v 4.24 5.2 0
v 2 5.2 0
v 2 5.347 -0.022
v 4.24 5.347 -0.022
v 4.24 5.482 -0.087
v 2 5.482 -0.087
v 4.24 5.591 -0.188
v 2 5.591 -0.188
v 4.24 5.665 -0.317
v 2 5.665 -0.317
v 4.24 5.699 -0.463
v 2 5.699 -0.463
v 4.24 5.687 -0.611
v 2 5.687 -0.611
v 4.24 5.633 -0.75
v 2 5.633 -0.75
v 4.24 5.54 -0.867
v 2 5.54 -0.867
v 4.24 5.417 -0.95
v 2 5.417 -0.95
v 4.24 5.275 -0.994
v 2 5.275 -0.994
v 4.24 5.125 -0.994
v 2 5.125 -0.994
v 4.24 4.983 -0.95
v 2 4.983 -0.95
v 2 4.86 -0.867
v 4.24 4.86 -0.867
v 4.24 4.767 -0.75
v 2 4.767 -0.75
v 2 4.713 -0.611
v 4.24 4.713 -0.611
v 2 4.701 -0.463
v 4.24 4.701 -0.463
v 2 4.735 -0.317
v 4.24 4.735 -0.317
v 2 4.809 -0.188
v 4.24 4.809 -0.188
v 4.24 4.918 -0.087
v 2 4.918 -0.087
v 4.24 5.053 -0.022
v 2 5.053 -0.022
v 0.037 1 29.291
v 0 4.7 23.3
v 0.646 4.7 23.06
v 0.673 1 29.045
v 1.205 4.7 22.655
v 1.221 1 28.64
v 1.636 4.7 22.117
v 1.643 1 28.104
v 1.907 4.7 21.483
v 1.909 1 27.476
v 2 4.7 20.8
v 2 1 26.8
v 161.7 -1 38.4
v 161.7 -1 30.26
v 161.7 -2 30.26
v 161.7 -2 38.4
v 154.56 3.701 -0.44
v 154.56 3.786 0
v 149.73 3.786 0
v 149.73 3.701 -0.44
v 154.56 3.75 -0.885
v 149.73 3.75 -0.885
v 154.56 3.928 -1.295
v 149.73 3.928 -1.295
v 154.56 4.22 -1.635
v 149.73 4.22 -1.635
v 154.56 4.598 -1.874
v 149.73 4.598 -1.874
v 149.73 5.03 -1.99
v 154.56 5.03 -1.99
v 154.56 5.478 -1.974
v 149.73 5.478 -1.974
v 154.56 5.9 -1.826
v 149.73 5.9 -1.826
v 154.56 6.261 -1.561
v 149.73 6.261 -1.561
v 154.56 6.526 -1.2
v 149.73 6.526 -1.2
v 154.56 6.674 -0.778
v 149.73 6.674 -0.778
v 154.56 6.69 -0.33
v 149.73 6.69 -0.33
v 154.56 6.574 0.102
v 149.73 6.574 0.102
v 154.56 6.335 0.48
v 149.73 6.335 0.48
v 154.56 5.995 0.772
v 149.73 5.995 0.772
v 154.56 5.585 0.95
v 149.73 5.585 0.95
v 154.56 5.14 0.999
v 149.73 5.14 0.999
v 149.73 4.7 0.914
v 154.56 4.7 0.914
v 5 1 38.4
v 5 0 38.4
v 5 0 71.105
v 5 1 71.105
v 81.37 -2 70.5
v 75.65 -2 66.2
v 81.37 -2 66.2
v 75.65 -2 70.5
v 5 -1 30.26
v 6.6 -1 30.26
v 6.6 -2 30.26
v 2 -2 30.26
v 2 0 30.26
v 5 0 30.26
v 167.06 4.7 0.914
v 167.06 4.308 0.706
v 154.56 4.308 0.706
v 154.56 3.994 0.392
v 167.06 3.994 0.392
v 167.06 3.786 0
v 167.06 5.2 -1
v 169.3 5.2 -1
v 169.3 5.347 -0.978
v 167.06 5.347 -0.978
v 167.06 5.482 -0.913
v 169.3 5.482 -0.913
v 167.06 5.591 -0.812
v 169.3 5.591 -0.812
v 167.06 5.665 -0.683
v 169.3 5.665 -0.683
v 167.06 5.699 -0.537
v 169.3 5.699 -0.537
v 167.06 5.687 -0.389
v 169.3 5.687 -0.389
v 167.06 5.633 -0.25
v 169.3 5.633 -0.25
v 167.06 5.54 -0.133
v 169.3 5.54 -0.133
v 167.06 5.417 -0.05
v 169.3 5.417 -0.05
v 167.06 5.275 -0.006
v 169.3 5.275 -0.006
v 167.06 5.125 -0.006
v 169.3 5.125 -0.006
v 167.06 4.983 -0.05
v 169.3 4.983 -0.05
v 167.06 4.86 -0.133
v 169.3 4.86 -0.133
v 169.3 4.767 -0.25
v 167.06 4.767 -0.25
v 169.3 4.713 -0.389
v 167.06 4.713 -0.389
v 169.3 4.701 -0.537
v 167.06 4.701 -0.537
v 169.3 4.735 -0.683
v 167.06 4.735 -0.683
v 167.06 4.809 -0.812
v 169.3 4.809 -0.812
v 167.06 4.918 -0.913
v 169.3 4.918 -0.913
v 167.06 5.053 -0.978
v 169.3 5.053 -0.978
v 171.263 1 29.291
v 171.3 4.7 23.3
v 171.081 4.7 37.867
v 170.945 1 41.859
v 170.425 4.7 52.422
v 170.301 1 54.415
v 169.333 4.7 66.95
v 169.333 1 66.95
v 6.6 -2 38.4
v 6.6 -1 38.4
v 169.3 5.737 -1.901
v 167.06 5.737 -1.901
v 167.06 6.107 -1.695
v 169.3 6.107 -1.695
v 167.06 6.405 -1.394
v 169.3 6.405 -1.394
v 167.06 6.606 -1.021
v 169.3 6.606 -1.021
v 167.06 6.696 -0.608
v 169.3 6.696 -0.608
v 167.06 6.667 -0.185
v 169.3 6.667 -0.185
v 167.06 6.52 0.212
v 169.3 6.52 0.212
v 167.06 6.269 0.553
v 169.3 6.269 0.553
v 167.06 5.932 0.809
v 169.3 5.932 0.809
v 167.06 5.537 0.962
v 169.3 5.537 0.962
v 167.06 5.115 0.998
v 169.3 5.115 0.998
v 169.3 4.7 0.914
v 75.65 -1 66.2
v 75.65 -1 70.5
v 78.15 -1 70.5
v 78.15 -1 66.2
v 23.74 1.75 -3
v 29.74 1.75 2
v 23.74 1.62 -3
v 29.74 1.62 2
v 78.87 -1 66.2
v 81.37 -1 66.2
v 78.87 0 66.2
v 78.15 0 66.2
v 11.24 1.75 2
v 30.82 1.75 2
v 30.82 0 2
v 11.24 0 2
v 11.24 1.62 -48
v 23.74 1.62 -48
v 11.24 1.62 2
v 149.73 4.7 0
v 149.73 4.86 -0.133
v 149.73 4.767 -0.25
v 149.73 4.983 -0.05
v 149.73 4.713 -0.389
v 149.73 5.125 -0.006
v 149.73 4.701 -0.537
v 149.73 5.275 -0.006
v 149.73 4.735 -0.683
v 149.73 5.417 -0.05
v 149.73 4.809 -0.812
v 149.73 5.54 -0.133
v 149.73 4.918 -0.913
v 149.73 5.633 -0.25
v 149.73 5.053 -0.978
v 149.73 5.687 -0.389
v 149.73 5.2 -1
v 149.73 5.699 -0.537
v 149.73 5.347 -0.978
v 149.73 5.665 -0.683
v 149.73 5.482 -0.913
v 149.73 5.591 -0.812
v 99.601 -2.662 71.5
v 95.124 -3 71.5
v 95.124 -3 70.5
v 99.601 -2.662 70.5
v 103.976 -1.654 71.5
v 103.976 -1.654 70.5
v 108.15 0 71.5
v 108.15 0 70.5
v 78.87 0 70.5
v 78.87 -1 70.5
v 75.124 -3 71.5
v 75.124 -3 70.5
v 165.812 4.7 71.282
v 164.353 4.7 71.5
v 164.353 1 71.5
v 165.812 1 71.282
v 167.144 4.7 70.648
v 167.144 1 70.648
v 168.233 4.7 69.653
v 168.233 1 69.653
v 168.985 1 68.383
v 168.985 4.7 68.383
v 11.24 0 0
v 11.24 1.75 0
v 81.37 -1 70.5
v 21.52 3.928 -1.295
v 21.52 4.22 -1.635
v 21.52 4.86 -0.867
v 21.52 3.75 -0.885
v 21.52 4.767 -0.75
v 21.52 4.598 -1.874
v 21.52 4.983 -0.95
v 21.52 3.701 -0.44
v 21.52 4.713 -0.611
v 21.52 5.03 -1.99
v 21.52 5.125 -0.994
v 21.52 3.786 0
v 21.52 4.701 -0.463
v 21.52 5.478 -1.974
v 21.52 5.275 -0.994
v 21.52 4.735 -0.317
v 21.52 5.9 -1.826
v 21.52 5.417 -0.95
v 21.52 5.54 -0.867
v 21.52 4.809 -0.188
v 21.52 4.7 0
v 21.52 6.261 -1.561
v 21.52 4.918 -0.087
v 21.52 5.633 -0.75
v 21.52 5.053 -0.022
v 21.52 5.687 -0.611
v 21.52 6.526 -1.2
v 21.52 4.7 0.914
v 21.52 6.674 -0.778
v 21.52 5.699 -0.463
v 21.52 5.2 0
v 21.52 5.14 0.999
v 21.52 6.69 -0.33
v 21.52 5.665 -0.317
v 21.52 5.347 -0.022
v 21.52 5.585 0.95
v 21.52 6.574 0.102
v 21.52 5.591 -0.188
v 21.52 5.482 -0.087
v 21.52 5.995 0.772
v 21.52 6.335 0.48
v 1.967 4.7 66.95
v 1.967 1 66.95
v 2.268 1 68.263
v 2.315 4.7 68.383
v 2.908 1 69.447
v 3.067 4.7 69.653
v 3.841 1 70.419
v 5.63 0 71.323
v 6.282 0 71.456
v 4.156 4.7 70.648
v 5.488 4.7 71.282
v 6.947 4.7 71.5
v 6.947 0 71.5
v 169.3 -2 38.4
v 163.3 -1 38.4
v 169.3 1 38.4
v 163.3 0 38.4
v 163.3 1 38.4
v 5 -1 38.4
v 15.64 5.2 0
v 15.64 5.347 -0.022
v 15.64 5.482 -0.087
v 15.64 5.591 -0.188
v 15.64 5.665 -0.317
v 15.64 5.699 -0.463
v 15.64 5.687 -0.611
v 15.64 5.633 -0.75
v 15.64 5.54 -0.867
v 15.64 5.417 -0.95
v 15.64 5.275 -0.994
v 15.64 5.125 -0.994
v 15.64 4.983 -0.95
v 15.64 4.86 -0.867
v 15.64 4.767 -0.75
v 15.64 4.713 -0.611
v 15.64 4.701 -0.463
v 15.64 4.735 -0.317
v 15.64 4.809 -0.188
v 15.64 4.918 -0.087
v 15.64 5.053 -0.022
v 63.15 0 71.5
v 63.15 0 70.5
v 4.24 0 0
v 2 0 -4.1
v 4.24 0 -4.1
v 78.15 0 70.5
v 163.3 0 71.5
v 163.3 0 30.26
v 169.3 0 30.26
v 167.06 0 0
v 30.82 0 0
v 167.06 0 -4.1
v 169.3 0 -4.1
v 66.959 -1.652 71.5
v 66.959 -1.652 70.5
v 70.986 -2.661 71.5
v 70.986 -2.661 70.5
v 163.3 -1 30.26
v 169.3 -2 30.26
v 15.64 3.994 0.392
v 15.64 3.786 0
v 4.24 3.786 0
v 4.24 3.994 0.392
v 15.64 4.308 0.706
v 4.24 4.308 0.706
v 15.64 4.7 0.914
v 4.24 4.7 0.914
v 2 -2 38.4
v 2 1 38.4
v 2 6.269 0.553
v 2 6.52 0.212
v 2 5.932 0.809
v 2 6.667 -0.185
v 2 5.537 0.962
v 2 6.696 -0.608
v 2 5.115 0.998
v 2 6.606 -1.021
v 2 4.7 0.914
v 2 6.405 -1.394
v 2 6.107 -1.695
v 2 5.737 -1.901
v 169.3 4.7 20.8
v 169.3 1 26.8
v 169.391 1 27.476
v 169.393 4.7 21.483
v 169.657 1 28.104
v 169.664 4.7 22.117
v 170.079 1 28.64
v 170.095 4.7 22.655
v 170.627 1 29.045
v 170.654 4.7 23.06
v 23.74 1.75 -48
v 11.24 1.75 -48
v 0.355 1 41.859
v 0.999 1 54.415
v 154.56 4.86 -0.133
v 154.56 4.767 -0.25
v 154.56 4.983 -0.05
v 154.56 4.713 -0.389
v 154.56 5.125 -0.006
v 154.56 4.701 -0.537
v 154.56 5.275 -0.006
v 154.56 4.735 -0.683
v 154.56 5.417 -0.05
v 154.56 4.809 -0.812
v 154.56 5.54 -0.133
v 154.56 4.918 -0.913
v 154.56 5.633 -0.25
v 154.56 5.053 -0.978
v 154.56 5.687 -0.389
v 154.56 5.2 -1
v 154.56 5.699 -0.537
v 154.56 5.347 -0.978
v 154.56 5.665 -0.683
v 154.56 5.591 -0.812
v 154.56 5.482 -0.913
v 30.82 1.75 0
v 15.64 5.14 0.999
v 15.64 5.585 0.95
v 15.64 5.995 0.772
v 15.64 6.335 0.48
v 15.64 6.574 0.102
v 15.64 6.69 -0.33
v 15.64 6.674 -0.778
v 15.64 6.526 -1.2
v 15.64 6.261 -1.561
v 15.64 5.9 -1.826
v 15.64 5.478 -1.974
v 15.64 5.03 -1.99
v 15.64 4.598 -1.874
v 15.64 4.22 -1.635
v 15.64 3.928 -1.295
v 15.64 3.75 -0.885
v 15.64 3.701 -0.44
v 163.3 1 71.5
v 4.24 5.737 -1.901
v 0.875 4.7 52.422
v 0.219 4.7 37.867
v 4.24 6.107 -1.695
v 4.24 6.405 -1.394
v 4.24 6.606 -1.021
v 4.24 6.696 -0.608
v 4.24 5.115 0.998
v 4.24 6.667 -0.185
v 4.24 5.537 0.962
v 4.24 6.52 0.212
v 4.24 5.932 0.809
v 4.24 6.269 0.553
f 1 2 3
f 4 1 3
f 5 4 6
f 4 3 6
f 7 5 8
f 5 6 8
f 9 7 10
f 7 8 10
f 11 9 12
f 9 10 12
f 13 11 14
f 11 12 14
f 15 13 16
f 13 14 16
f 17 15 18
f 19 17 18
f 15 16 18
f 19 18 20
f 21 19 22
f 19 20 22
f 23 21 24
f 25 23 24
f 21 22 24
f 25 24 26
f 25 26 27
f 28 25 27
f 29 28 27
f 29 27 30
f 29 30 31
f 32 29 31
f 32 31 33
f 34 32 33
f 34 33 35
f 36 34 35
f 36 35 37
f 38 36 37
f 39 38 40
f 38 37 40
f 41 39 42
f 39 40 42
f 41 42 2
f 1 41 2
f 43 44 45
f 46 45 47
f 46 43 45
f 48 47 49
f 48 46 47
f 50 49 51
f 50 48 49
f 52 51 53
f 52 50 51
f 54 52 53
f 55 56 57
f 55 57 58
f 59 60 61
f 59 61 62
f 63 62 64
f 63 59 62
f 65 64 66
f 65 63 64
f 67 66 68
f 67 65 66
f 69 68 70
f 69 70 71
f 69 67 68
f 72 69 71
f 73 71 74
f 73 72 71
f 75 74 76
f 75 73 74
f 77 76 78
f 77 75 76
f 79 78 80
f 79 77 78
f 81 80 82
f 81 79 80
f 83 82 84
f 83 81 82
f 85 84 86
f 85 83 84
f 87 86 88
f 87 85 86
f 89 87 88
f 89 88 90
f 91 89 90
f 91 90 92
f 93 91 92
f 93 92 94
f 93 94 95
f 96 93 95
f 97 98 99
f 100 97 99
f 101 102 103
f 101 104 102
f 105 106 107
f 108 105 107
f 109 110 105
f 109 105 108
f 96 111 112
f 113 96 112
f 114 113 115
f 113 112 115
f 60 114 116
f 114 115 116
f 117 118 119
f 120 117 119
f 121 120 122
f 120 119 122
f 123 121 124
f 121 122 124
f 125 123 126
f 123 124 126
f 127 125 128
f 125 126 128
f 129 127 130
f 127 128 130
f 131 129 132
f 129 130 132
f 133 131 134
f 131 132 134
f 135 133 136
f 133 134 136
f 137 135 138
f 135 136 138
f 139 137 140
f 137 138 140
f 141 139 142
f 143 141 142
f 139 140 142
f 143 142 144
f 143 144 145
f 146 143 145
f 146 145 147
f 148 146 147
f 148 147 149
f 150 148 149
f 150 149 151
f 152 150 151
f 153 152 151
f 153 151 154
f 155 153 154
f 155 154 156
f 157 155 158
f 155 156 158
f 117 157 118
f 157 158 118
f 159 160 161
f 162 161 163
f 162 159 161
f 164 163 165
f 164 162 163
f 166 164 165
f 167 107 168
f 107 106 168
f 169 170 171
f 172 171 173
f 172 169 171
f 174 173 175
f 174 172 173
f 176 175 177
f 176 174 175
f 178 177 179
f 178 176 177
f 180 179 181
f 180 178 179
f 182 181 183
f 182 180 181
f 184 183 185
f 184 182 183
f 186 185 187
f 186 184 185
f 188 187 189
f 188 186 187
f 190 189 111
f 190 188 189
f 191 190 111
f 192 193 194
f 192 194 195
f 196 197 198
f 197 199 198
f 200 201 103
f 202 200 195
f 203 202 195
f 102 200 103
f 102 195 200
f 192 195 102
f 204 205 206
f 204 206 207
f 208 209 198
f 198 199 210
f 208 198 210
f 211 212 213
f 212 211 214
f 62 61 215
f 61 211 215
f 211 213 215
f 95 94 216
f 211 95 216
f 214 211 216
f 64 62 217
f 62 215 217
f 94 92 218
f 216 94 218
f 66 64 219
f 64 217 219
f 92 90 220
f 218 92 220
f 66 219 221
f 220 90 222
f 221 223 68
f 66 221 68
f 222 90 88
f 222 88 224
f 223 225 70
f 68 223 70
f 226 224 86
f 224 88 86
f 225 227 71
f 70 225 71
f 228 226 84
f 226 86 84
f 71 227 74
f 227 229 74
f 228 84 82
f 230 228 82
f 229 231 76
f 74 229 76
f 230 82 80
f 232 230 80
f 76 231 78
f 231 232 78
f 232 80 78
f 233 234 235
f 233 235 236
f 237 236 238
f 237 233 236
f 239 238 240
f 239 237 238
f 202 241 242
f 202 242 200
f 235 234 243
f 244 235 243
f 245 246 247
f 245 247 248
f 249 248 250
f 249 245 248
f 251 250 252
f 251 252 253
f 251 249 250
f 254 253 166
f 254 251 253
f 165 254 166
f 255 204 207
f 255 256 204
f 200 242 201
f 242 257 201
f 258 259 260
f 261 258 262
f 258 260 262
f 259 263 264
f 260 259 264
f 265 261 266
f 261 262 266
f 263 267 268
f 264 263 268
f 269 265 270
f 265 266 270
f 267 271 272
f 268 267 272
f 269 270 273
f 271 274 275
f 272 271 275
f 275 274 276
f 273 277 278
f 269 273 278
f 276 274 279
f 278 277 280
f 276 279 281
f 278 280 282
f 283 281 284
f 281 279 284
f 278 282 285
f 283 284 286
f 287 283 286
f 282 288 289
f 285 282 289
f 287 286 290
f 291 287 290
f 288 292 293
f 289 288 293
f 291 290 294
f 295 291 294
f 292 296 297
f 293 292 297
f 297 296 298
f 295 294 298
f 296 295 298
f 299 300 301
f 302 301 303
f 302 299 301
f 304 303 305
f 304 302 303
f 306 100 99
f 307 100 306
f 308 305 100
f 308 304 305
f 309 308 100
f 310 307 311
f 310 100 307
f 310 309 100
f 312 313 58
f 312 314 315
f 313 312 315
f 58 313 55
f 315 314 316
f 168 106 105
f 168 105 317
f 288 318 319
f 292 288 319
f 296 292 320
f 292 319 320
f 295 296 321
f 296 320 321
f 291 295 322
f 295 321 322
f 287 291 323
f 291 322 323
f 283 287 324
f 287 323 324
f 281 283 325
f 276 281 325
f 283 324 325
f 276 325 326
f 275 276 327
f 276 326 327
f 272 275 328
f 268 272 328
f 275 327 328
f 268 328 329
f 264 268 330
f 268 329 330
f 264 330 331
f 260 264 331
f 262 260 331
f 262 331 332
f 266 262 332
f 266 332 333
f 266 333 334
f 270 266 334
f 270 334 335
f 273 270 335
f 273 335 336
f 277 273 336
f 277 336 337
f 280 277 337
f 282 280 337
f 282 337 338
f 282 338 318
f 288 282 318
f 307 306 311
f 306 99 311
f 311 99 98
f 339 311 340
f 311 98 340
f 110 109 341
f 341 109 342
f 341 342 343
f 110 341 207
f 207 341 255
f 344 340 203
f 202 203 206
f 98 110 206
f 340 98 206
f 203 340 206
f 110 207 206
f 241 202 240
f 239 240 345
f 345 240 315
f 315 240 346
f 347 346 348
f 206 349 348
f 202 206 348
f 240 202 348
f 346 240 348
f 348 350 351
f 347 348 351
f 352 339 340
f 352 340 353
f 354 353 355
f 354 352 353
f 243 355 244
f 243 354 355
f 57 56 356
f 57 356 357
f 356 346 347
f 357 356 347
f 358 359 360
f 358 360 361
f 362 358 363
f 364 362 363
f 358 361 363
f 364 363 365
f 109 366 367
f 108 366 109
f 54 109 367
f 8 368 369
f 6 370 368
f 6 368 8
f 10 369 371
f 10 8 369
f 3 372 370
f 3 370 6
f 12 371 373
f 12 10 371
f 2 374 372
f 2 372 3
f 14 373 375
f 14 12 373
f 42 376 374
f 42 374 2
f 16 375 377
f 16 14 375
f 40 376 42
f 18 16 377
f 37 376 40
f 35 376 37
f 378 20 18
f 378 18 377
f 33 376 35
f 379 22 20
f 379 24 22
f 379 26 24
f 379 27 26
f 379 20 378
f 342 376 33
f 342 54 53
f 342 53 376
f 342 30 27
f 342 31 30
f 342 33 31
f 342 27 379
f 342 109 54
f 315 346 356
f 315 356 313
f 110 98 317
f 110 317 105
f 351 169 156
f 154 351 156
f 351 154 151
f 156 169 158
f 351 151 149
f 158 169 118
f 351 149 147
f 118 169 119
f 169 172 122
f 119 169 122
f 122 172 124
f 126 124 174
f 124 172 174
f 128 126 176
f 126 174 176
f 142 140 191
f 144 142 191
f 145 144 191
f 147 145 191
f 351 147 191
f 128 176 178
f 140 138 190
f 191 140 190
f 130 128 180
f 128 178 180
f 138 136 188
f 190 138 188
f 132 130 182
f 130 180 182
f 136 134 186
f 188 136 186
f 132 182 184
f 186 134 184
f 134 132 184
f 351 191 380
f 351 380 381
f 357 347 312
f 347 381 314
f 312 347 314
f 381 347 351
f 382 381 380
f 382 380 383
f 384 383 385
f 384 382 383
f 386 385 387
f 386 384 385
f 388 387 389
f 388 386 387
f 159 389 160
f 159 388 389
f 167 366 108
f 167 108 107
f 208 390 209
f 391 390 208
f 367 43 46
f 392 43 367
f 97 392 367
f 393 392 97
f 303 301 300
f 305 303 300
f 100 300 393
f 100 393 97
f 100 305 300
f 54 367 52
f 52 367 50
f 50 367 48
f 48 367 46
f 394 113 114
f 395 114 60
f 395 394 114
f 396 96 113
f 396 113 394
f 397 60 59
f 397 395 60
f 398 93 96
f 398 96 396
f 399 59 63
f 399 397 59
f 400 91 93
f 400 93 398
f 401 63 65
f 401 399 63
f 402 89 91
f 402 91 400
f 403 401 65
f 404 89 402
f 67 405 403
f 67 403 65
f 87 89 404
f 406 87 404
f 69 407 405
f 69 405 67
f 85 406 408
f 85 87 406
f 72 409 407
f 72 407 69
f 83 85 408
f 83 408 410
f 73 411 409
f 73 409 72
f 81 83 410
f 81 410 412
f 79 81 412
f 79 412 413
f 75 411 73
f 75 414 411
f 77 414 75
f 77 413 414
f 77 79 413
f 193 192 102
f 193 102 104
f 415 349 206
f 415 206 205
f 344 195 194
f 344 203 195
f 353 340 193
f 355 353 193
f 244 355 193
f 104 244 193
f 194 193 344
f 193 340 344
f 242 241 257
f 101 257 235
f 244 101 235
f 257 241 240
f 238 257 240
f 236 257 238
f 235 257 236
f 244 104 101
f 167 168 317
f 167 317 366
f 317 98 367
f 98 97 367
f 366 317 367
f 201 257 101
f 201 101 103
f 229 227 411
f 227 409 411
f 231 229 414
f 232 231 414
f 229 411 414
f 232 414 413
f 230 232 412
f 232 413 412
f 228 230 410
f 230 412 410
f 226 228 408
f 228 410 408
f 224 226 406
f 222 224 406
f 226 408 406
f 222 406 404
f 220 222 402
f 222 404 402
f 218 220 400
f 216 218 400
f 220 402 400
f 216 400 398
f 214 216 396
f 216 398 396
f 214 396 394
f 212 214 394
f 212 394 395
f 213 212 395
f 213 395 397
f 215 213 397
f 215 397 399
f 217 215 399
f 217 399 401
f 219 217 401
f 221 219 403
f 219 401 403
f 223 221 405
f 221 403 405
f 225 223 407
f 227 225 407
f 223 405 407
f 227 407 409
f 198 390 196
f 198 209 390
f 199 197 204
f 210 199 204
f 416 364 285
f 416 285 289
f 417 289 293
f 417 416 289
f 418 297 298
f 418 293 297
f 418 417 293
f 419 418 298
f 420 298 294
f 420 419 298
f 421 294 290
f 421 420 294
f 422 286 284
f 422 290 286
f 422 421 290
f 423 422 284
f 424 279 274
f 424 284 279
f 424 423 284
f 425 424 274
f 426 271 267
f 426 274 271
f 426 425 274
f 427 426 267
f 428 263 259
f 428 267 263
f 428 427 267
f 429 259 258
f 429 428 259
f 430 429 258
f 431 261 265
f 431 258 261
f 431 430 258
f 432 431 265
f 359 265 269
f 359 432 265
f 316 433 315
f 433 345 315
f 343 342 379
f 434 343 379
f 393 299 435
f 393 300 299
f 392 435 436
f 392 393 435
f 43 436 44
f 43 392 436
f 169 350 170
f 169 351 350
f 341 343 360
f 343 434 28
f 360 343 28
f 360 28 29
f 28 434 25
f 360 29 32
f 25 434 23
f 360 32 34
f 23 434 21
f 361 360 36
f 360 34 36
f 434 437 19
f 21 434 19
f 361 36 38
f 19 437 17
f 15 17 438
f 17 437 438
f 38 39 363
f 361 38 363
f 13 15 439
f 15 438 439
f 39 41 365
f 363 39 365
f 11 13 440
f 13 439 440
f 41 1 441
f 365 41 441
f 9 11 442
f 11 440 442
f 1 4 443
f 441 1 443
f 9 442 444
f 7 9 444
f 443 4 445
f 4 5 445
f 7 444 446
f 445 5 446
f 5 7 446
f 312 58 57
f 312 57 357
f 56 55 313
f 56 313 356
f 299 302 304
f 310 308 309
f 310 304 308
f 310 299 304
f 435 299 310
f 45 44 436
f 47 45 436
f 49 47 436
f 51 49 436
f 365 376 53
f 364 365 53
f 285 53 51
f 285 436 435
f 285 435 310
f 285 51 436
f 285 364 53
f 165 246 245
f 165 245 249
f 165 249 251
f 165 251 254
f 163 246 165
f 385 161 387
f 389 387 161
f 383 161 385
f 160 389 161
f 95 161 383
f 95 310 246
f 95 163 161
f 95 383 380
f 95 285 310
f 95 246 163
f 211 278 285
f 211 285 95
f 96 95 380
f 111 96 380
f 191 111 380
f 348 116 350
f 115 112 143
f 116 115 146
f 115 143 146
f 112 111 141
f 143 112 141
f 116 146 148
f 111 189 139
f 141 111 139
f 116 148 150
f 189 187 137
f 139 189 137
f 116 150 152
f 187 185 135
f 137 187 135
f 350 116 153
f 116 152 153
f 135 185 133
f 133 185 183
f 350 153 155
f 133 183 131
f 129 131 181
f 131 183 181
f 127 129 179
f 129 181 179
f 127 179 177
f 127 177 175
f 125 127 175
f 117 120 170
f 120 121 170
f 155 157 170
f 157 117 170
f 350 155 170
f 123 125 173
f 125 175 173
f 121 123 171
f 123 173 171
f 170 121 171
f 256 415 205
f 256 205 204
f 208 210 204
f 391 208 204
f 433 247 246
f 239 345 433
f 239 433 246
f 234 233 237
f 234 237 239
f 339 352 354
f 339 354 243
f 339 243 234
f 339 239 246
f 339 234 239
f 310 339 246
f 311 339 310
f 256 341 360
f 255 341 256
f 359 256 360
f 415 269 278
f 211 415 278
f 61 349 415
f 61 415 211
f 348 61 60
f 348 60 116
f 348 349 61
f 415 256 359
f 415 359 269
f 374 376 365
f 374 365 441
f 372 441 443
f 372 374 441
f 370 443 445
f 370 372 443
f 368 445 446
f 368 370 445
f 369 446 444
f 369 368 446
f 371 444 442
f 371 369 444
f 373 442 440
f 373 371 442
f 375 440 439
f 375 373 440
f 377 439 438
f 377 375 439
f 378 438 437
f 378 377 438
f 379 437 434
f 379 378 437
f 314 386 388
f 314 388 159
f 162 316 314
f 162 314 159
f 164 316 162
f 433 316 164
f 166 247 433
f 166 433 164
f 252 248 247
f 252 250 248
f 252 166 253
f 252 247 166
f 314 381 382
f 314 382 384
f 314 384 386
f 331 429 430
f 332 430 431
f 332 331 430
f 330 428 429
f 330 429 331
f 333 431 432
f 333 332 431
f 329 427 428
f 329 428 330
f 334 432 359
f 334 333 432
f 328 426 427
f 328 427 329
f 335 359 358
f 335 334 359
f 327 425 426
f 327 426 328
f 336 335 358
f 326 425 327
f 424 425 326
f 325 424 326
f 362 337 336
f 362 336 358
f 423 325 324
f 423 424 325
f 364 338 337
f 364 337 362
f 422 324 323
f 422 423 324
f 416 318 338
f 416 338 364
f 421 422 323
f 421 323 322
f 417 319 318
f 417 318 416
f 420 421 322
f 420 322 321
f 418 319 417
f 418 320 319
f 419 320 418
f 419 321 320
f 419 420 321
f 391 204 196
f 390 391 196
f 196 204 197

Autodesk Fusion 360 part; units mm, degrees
sketch "Sketch1" plane through (0, 0, 0) normal (0, 1, 0) x (1, 0, 0)
  line L0 (0, 0) -> (171.3, 0)
  line L1 (171.3, 0) -> (171.3, -71.5)
  line L2 (171.3, -71.5) -> (0, -71.5)
  line L3 (0, -71.5) -> (0, 0)
  line L4 (171.3, 0) -> (169.3, 0)
  line L5 (169.3, 0) -> (169.3, -23.3)
  line L6 (169.3, -23.3) -> (171.3, -23.3)
  line L7 (171.3, -23.3) -> (171.3, 0)
  line L8 (0, 0) -> (2, 0)
  line L9 (2, 0) -> (2, -23.3)
  line L10 (2, -23.3) -> (0, -23.3)
  line L11 (0, -23.3) -> (0, 0)
  arc A0 (0, -23.3) -> (2.4, -71.5) centre (485.2085, -23.3) ccw
  arc A1 (168.9, -71.5) -> (171.3, -23.3) centre (-313.9083, -23.3) ccw
  line L12 (2, 0) -> (0, 0)
  line L13 (0, 0) -> (0, -20.8)
  line L14 (0, -20.8) -> (2, -20.8)
  line L15 (2, -20.8) -> (2, 0)
  arc A2 (0, -23.3) -> (2, -20.8) centre (-0.5625, -20.8) ccw
  line L16 (171.3, 0) -> (169.3, 0)
  line L17 (169.3, 0) -> (169.3, -20.8)
  line L18 (169.3, -20.8) -> (171.3, -20.8)
  line L19 (171.3, -20.8) -> (171.3, 0)
  arc A3 (169.3, -20.8) -> (171.3, -23.3) centre (171.8625, -20.8) ccw
  dimension "d1" = 171.3
  dimension "d2" = 71.5
  dimension "d3" = 23.3
  dimension "d4" = 2
  dimension "d5" = 2
  dimension "d6" = 23.3
  dimension "d7" = 2.4
  dimension "d8" = 2.4
  dimension "d15" = 2.5
  dimension "d16" = 2.5
extrude "Extrude1" add sketch "Sketch1" along normal blind 4.7 contours L0 L2 L5 L6 L9 L10 A0 A1 L15 L17 | L9 L10 A2 | L5 L6 A3 makes body 1
sketch "Right Arm" plane through (169.3, 0, 0) normal (1, 0, 0) x (0, 0, -1)
  line L0 (-20.8, 0) -> (0, 0)
  line L1 (0, 0) -> (0, 4.7)
  line L2 (0, 4.7) -> (-20.8, 4.7)
  line L3 (-20.8, 4.7) -> (-20.8, 0)
  circle A0 centre (0.5, 5.2) radius 1.5
  line L4 (0, 0) -> (4.1, 0)
  line L5 (4.1, 0) -> (1.9006, 5.737)
  circle A1 centre (0.5, 5.2) radius 0.5
  dimension "d20" = 0.5
  dimension "d21" = 0.5
  dimension "d22" = 3
  dimension "d23" = 4.1
  dimension "d26" = 1
extrude "Extrude3" cut sketch "Right Arm" against normal blind 14.74 contours L1 L2 A0 | L1 L2 A0 bodies 1
extrude "Extrude2" add sketch "Right Arm" against normal blind 19.57 contours L1 L2 A0 | L1 L2 A0 bodies 1
extrude "Extrude4" cut sketch "Right Arm" against normal blind 14.74 contours L1 L2 A0 | L1 L2 A0 bodies 1
extrude "Extrude5" add sketch "Right Arm" against normal blind 2.24 contours L1 A0 L4 L5 | L1 L2 A0 | L1 L2 A0 bodies 1
sketch "Left Arm" plane through (2, 0, 0) normal (-1, 0, 0) x (0, 0, 1)
  line L0 (0, 0) -> (20.8, 0)
  line L1 (20.8, 0) -> (20.8, 4.7)
  line L2 (20.8, 4.7) -> (0, 4.7)
  line L3 (0, 4.7) -> (0, 0)
  circle A0 centre (-0.5, 5.2) radius 1.5
  line L4 (0, 0) -> (-4.1, 0)
  line L5 (-4.1, 0) -> (-1.766, 6.0881)
  circle A1 centre (-0.5, 5.2) radius 0.5
  dimension "d42" = 3
  dimension "d43" = 1
  dimension "d44" = 0.5
  dimension "d45" = 0.5
  dimension "d46" = 4.1
extrude "Extrude6" add sketch "Left Arm" against normal blind 19.52 contours L2 L3 A0 | L2 L3 A0 bodies 1
extrude "Extrude7" cut sketch "Left Arm" against normal blind 13.64 contours L2 L3 A0 | L2 L3 A0 bodies 1
extrude "Extrude8" add sketch "Left Arm" against normal blind 2.24 contours L3 A0 L4 L5 | L2 L3 A0 | L2 L3 A0 bodies 1
sketch "Cable Cutaway" plane through (0, 0, 0) normal (0, 0, -1) x (-1, 0, 0)
  line L0 (-4.24, 0) -> (-4.24, 3.7858)
  line L1 (-4.24, 3.7858) -> (-15.64, 3.7858)
  line L2 (-15.64, 3.7858) -> (-21.52, 3.7858)
  line L3 (-21.52, 3.7858) -> (-21.52, 4.7)
  line L4 (-21.52, 4.7) -> (-149.73, 4.7)
  line L5 (-149.73, 4.7) -> (-149.73, 3.7858)
  line L6 (-149.73, 3.7858) -> (-154.56, 3.7858)
  line L7 (-154.56, 3.7858) -> (-167.06, 3.7858)
  line L8 (-167.06, 3.7858) -> (-167.06, 0)
  line L9 (-167.06, 0) -> (-4.24, 0)
  line L10 (-11.24, 0) -> (-30.82, 0)
  line L11 (-30.82, 0) -> (-30.82, 1.75)
  line L12 (-30.82, 1.75) -> (-11.24, 1.75)
  line L13 (-11.24, 1.75) -> (-11.24, 0)
  dimension "d53" = 7
  dimension "d57" = 19.58
  dimension "d59" = 1.75
extrude "Extrude9" cut sketch "Cable Cutaway" against normal blind 2 contours L9 L10 L11 L12 L13 bodies 1
sketch "Cable Extrusion" plane through (0, 0, 2) normal (0, 0, -1) x (-1, 0, 0)
  line L0 (-11.24, 1.75) -> (-30.82, 1.75)
  line L1 (-30.82, 1.75) -> (-30.82, 0)
  line L2 (-30.82, 0) -> (-11.24, 0)
  line L3 (-11.24, 0) -> (-11.24, 1.75)
  line L4 (-11.24, 1.75) -> (-29.74, 1.75)
  line L5 (-29.74, 1.75) -> (-29.74, 1.62)
  line L6 (-29.74, 1.62) -> (-11.24, 1.62)
  line L7 (-11.24, 1.62) -> (-11.24, 1.75)
  dimension "d63" = 0.13
  dimension "d64" = 18.5
extrude "Extrude10" add sketch "Cable Extrusion" along normal blind 50 separate body contours L0 L3 L4 L5 L6 L7 makes body 2
sketch "Cable" plane through (0, 1.62, 0) normal (0, -1, 0) x (1, 0, 0)
  line L0 (29.74, 2) -> (11.24, 2)
  line L1 (11.24, 2) -> (11.24, -48)
  line L2 (11.24, -48) -> (29.74, -48)
  line L3 (29.74, -48) -> (29.74, 2)
  line L4 (11.24, -48) -> (23.74, -48)
  line L5 (23.74, -48) -> (23.74, -3)
  line L6 (23.74, -3) -> (11.24, -3)
  line L7 (11.24, -3) -> (11.24, -48)
  line L8 (29.74, 2) -> (23.74, -3)
  dimension "d69" = 12.5
  dimension "d72" = 5
extrude "Extrude11" cut sketch "Cable" against normal blind 0.13 contours L0 L1 L6 L8 | L1 L2 L4 L5 L6 L7 keep common part bodies 2
sketch "Hooks" plane through (0, 0, 0) normal (0, -1, 0) x (1, 0, 0)
  line L0 (11.24, 0) -> (11.24, 2)
  line L1 (11.24, 2) -> (30.82, 2)
  line L2 (30.82, 2) -> (30.82, 0)
  line L3 (30.82, 0) -> (167.06, 0)
  line L4 (167.06, 0) -> (167.06, -4.1)
  line L5 (167.06, -4.1) -> (169.3, -4.1)
  line L6 (169.3, -4.1) -> (169.3, 20.8)
  arc A0 (171.3, 23.3) -> (169.3, 20.8) centre (171.8625, 20.8) ccw
  arc A1 (171.3, 23.3) -> (168.9, 71.5) centre (-313.9083, 23.3) ccw
  line L7 (168.9, 71.5) -> (2.4, 71.5)
  arc A2 (2.4, 71.5) -> (0, 23.3) centre (485.2085, 23.3) ccw
  arc A3 (2, 20.8) -> (0, 23.3) centre (-0.5625, 20.8) ccw
  line L8 (2, 20.8) -> (2, -4.1)
  line L9 (2, -4.1) -> (4.24, -4.1)
  line L10 (4.24, -4.1) -> (4.24, 0)
  line L11 (4.24, 0) -> (11.24, 0)
  line L12 (2, -4.1) -> (169.3, -4.1)
  line L13 (169.3, -4.1) -> (169.3, 38.4)
  line L14 (169.3, 38.4) -> (2, 38.4)
  line L15 (2, 38.4) -> (2, -4.1)
  line L16 (169.3, 20.8) -> (169.3, 0)
  line L17 (163.3, 38.4) -> (5, 38.4)
  line L18 (5, 38.4) -> (5, 71.5)
  line L19 (5, 71.5) -> (163.3, 71.5)
  line L20 (163.3, 71.5) -> (163.3, 38.4)
  line L21 (169.3, 38.4) -> (163.3, 38.4)
  line L22 (163.3, 38.4) -> (163.3, 30.26)
  line L23 (163.3, 30.26) -> (169.3, 30.26)
  line L24 (169.3, 30.26) -> (169.3, 38.4)
  line L25 (163.3, 30.26) -> (161.7, 30.26)
  line L26 (161.7, 30.26) -> (161.7, 38.4)
  line L27 (161.7, 38.4) -> (163.3, 38.4)
  line L28 (163.3, 38.4) -> (163.3, 30.26)
  line L29 (2, 38.4) -> (5, 38.4)
  line L30 (5, 38.4) -> (5, 30.26)
  line L31 (5, 30.26) -> (2, 30.26)
  line L32 (2, 30.26) -> (2, 38.4)
  line L33 (5, 30.26) -> (6.6, 30.26)
  line L34 (6.6, 30.26) -> (6.6, 38.4)
  line L35 (6.6, 38.4) -> (5, 38.4)
  line L36 (5, 38.4) -> (5, 30.26)
  dimension "d75" = 42.5
  dimension "d89" = 1.6
  dimension "d90" = 1.6
  dimension "d91" = 8.14
  dimension "d92" = 8.14
  dimension "d156" = 3
  dimension "d157" = 6
extrude "Extrude17" add sketch "Hooks" along normal blind 2 contours L13 L14 L21 L22 L23 L24 L28 | L14 L17 L22 L25 L26 L27 L28 bodies 1
extrude "Extrude16" add sketch "Hooks" along normal blind 2 contours L13 L14 L21 L22 L23 L24 L28 | L14 L17 L22 L25 L26 L27 L28 bodies 1
extrude "Extrude15" add sketch "Hooks" along normal blind 2 contours L13 L14 L21 L22 L23 L24 L28 | L14 L17 L22 L25 L26 L27 L28 bodies 1
extrude "Extrude14" add sketch "Hooks" along normal blind 1 contours L14 L17 L22 L25 L26 L27 L28 bodies 1
extrude "Extrude13" add sketch "Hooks" along normal blind 2 contours L13 L14 L21 L22 L23 L24 L28 | L14 L17 L22 L25 L26 L27 L28 bodies 1
extrude "Extrude12" cut sketch "Hooks" against normal blind 1 contours L7 A2 A3 L14 L15 L18 L29 L32 | A0 A1 L7 L13 L14 L20 L21 L24 bodies 1
fillet "Fillet1" radius 5 1 edges at (2.4, 2.85, 71.5) on bodies 1
fillet "Fillet2" radius 5 1 edges at (168.9, 2.85, 71.5) on bodies 1
sketch "Right Hook Inset" plane through (161.7, 0, 0) normal (-1, 0, 0) x (0, 0, 1)
  line L0 (30.26, 0) -> (30.26, -2)
  line L1 (30.26, -2) -> (38.4, -2)
  line L2 (38.4, -2) -> (38.4, 0)
  line L3 (38.4, 0) -> (30.26, 0)
  line L4 (30.26, 0) -> (38.4, 0)
  line L5 (38.4, 0) -> (38.4, -1)
  line L6 (38.4, -1) -> (30.26, -1)
  line L7 (30.26, -1) -> (30.26, 0)
  line L8 (30.26, 0) -> (38.4, 0)
  dimension "d103" = 1
extrude "Extrude18" cut sketch "Right Hook Inset" against normal blind 1.6 contours L0 L2 L3 L4 L5 L6 L7 L8 bodies 1
extrude "Extrude19" add sketch "Hooks" along normal blind 2 contours L14 L15 L29 L30 L31 L32 L36 | L14 L17 L30 L33 L34 L35 L36 bodies 1
sketch "Left Hook Inset" plane through (6.6, 0, 0) normal (1, 0, 0) x (0, 0, -1)
  line L0 (-30.26, 0) -> (-38.4, 0)
  line L1 (-38.4, 0) -> (-38.4, -2)
  line L2 (-38.4, -2) -> (-30.26, -2)
  line L3 (-30.26, -2) -> (-30.26, 0)
  line L4 (-38.4, 0) -> (-30.26, 0)
  line L5 (-30.26, 0) -> (-30.26, -1)
  line L6 (-30.26, -1) -> (-38.4, -1)
  line L7 (-38.4, -1) -> (-38.4, 0)
  line L8 (-30.26, 0) -> (-38.4, 0)
  dimension "d108" = 1
extrude "Extrude20" cut sketch "Left Hook Inset" against normal blind 1.6 contours L0 L1 L3 L4 L5 L6 L7 L8 bodies 1
sketch "Front Feature" plane through (0, 0, 71.5) normal (0, 0, 1) x (1, 0, 0)
  line L0 (164.3529, 1) -> (164.3529, 4.7)
  line L1 (164.3529, 4.7) -> (6.9471, 4.7)
  line L2 (6.9471, 4.7) -> (6.9471, 0)
  line L3 (6.9471, 0) -> (163.3, 0)
  line L4 (63.15, 4.7) -> (108.15, 4.7)
  line L5 (108.15, 4.7) -> (108.15, -3)
  line L6 (108.15, -3) -> (63.15, -3)
  line L7 (63.15, -3) -> (63.15, 4.7)
  line L8 (75.1236, 0) -> (95.1236, 0)
  line L9 (95.1236, 0) -> (95.1236, -3)
  line L10 (95.1236, -3) -> (75.1236, -3)
  line L11 (75.1236, -3) -> (75.1236, 0)
  arc A0 (63.15, 0) -> (75.1236, -3) centre (75.1236, 22.3943) ccw
  arc A1 (95.1236, -3) -> (108.15, 0) centre (95.1236, 26.7814) ccw
  line L12 (163.3, 1) -> (164.3529, 1)
  line L13 (163.3, 0) -> (163.3, 1)
  dimension "d111" = 45
  dimension "d115" = 7.7
  dimension "d116" = 20
extrude "Extrude21" add sketch "Front Feature" against normal blind 1 contours L3 L9 A1 | L3 L11 A0 | L3 L6 L8 L9 L10 L11 bodies 1
sketch "Front Hook" plane through (0, 0, 0) normal (0, -1, 0) x (1, 0, 0)
  line L0 (63.15, 70.5) -> (63.15, 71.5)
  line L1 (63.15, 71.5) -> (6.9471, 71.5)
  line L2 (5, 71.1053) -> (5, 38.4)
  line L3 (5, 38.4) -> (5, 30.26)
  line L4 (5, 30.26) -> (2, 30.26)
  line L5 (2, 30.26) -> (2, -4.1)
  line L6 (2, -4.1) -> (4.24, -4.1)
  line L7 (4.24, -4.1) -> (4.24, 0)
  line L8 (4.24, 0) -> (11.24, 0)
  line L9 (11.24, 0) -> (11.24, 2)
  line L10 (11.24, 2) -> (30.82, 2)
  line L11 (30.82, 2) -> (30.82, 0)
  line L12 (30.82, 0) -> (167.06, 0)
  line L13 (167.06, 0) -> (167.06, -4.1)
  line L14 (167.06, -4.1) -> (169.3, -4.1)
  line L15 (169.3, -4.1) -> (169.3, 30.26)
  line L16 (169.3, 30.26) -> (163.3, 30.26)
  line L17 (163.3, 30.26) -> (163.3, 38.4)
  line L18 (163.3, 38.4) -> (163.3, 71.5)
  line L19 (108.15, 71.5) -> (108.15, 70.5)
  line L20 (108.15, 70.5) -> (63.15, 70.5)
  line L21 (75.65, 70.5) -> (81.37, 70.5)
  line L22 (81.37, 70.5) -> (81.37, 66.2)
  line L23 (81.37, 66.2) -> (75.65, 66.2)
  line L24 (75.65, 66.2) -> (75.65, 70.5)
  arc A0 (6.9471, 71.5) -> (5, 71.1053) centre (6.9471, 66.5) ccw
  line L25 (163.3, 71.5) -> (108.15, 71.5)
  dimension "d123" = 12.5
  dimension "d124" = 5.72
  dimension "d125" = 4.3
extrude "Extrude22" add sketch "Front Hook" along normal blind 2 contours L20 L21 L22 L23 L24 bodies 1
sketch "Front Hook Right Inset" plane through (81.37, 0, 0) normal (1, 0, 0) x (0, 0, -1)
  line L0 (-66.2, 0) -> (-70.5, 0)
  line L1 (-70.5, 0) -> (-70.5, -2)
  line L2 (-70.5, -2) -> (-66.2, -2)
  line L3 (-66.2, -2) -> (-66.2, 0)
  line L4 (-66.2, 0) -> (-70.5, 0)
  line L5 (-70.5, 0) -> (-70.5, -1)
  line L6 (-70.5, -1) -> (-66.2, -1)
  line L7 (-66.2, -1) -> (-66.2, 0)
  dimension "d128" = 1
extrude "Extrude23" cut sketch "Front Hook Right Inset" against normal blind 2.5 contours L0 L1 L3 L4 L5 L6 L7 bodies 1
sketch "Front Hook Left Inset" plane through (75.65, 0, 0) normal (-1, 0, 0) x (0, 0, 1)
  line L0 (70.5, 0) -> (66.2, 0)
  line L1 (66.2, 0) -> (66.2, -2)
  line L2 (66.2, -2) -> (70.5, -2)
  line L3 (70.5, -2) -> (70.5, 0)
  line L4 (66.2, 0) -> (70.5, 0)
  line L5 (70.5, 0) -> (70.5, -1)
  line L6 (70.5, -1) -> (66.2, -1)
  line L7 (66.2, -1) -> (66.2, 0)
  dimension "d132" = 1
extrude "Extrude24" cut sketch "Front Hook Left Inset" against normal blind 2.5 contours L0 L1 L3 L4 L5 L6 L7 bodies 1
sketch "Left Side Detail Angle" plane through (2, 0, 0) normal (-1, 0, 0) x (0, 0, 1)
  circle A0 centre (-0.5, 5.2) radius 0.5
  line L0 (38.4, -2) -> (38.4, 1)
  line L1 (38.4, 1) -> (20.8, 1)
  line L2 (20.8, 1) -> (20.8, 4.7)
  line L3 (20.8, 4.7) -> (0.9142, 4.7)
  arc A1 (0.9142, 4.7) -> (-1.9006, 5.7369) centre (-0.5, 5.2) ccw
  line L4 (-1.9006, 5.7369) -> (-4.1, 0)
  line L5 (-4.1, 0) -> (30.26, 0)
  line L6 (30.26, 0) -> (30.26, -2)
  line L7 (30.26, -2) -> (38.4, -2)
  line L8 (20.8, 4.7) -> (26.8, 1)
  dimension "d141" = 6
sketch "Left Side Detail" plane through (0, 4.7, 0) normal (0, 1, 0) x (-1, 0, 0)
  arc A0 (-164.3529, 71.5) -> (-169.3326, 66.9498) centre (-164.3529, 66.5) ccw
  arc A1 (-169.3326, 66.9498) -> (-171.3, 23.3) centre (313.9083, 23.3) ccw
  arc A2 (-169.3, 20.8) -> (-171.3, 23.3) centre (-171.8625, 20.8) ccw
  line L0 (-169.3, 20.8) -> (-169.3, 0.9142)
  line L1 (-169.3, 0.9142) -> (-167.06, 0.9142)
  line L2 (-167.06, 0.9142) -> (-154.56, 0.9142)
  line L3 (-154.56, 0.9142) -> (-149.73, 0.9142)
  line L4 (-149.73, 0.9142) -> (-149.73, 0)
  line L5 (-149.73, 0) -> (-21.52, 0)
  line L6 (-21.52, 0) -> (-21.52, 0.9142)
  line L7 (-21.52, 0.9142) -> (-15.64, 0.9142)
  line L8 (-15.64, 0.9142) -> (-4.24, 0.9142)
  line L9 (-4.24, 0.9142) -> (-2, 0.9142)
  line L10 (-2, 0.9142) -> (-2, 20.8)
  arc A3 (0, 23.3) -> (-2, 20.8) centre (0.5625, 20.8) ccw
  arc A4 (0, 23.3) -> (-1.9674, 66.9498) centre (-485.2085, 23.3) ccw
  arc A5 (-1.9674, 66.9498) -> (-6.9471, 71.5) centre (-6.9471, 66.5) ccw
  line L11 (-6.9471, 71.5) -> (-164.3529, 71.5)
  line L12 (-2, 0.9142) -> (0, 0.9142)
  line L13 (0, 0.9142) -> (0, 23.3)
  line L14 (0, 23.3) -> (-2, 23.3)
  line L15 (-2, 23.3) -> (-2, 0.9142)
sweep "Sweep2" cut profiles "Left Side Detail" path "Left Side Detail Angle" along L8 section 1 contours L10 A3 L12 L13 L15 bodies 1
sketch "Right Side Detail Angle" plane through (169.3, 0, 0) normal (1, 0, 0) x (0, 0, -1)
  circle A0 centre (0.5, 5.2) radius 0.5
  line L0 (-38.4, 1) -> (-38.4, -2)
  line L1 (-38.4, -2) -> (-30.26, -2)
  line L2 (-30.26, -2) -> (-30.26, 0)
  line L3 (-30.26, 0) -> (4.1, 0)
  line L4 (4.1, 0) -> (1.9006, 5.737)
  arc A1 (1.9006, 5.737) -> (-0.9142, 4.7) centre (0.5, 5.2) ccw
  line L5 (-0.9142, 4.7) -> (-20.8, 4.7)
  line L6 (-20.8, 4.7) -> (-20.8, 1)
  line L7 (-20.8, 1) -> (-38.4, 1)
  line L8 (-20.8, 4.7) -> (-26.8, 1)
  dimension "d149" = 6
sketch "Right Side Detail" plane through (0, 4.7, 0) normal (0, 1, 0) x (-1, 0, 0)
  arc A0 (-164.3529, 71.5) -> (-169.3326, 66.9498) centre (-164.3529, 66.5) ccw
  arc A1 (-169.3326, 66.9498) -> (-171.3, 23.3) centre (313.9083, 23.3) ccw
  arc A2 (-169.3, 20.8) -> (-171.3, 23.3) centre (-171.8625, 20.8) ccw
  line L0 (-169.3, 20.8) -> (-169.3, 0.9142)
  line L1 (-169.3, 0.9142) -> (-167.06, 0.9142)
  line L2 (-167.06, 0.9142) -> (-154.56, 0.9142)
  line L3 (-154.56, 0.9142) -> (-149.73, 0.9142)
  line L4 (-149.73, 0.9142) -> (-149.73, 0)
  line L5 (-149.73, 0) -> (-21.52, 0)
  line L6 (-21.52, 0) -> (-21.52, 0.9142)
  line L7 (-21.52, 0.9142) -> (-15.64, 0.9142)
  line L8 (-15.64, 0.9142) -> (-4.24, 0.9142)
  line L9 (-4.24, 0.9142) -> (-2, 0.9142)
  line L10 (-2, 0.9142) -> (-2, 20.8)
  arc A3 (0, 23.3) -> (-2, 20.8) centre (0.5625, 20.8) ccw
  arc A4 (0, 23.3) -> (-1.9674, 66.9498) centre (-485.2085, 23.3) ccw
  arc A5 (-1.9674, 66.9498) -> (-6.9471, 71.5) centre (-6.9471, 66.5) ccw
  line L11 (-6.9471, 71.5) -> (-164.3529, 71.5)
  line L12 (-169.3, 0.9142) -> (-171.3, 0.9142)
  line L13 (-171.3, 0.9142) -> (-171.3, 23.3)
  line L14 (-171.3, 23.3) -> (-169.3, 23.3)
  line L15 (-169.3, 23.3) -> (-169.3, 0.9142)
sweep "Sweep3" cut profiles "Right Side Detail" path "Right Side Detail Angle" along L8 section 1 contours A2 L0 L12 L13 L15 bodies 1
equation "d1 = width"
equation "d2 = depth"
equation "d3 = depth - curveDepth"
equation "d4 = slideInset"
equation "d5 = slideInset"
equation "d6 = depth - curveDepth"
equation "d7 = curveInset"
equation "d8 = curveInset"
equation "depth = 71.5 mm"
equation "curveDepth = 48.2 mm"
equation "curveInset = 2.4 mm"
equation "slideInset = 2 mm"
equation "width = 171.3 mm"
equation "height = 4.7 mm"
equation "d15 = backCurveDepth"
equation "d16 = backCurveDepth"
equation "backCurveDepth = 2.5 mm"
equation "d18 = height"
equation "d20 = hingeOffset"
equation "d21 = hingeOffset"
equation "d22 = hingeDiameter"
equation "d23 = armDepth"
equation "hingeDiameter = 3 mm"
equation "armDepth = 4.1 mm"
equation "d26 = hingeDiameterInner"
equation "hingeDiameterInner = 1 mm"
equation "leftHingeEndWidth = 5.88 mm"
equation "rightHingeEndWidth = 4.83 mm"
equation "armWidth = 2.24 mm"
equation "leftHingeSlotWidth = 11.4 mm"
equation "rightHingeSlotWidth = 12.5 mm"
equation "d33 = -rightHingeEndWidth - rightHingeSlotWidth - armWidth"
equation "d35 = -rightHingeSlotWidth - armWidth"
equation "d37 = -rightHingeSlotWidth - armWidth"
equation "d39 = -armWidth"
equation "hingeOffset = 0.5 mm"
equation "d42 = hingeDiameter"
equation "d43 = hingeDiameterInner"
equation "d44 = hingeOffset"
equation "d45 = hingeOffset"
equation "d46 = armDepth"
equation "d47 = -leftHingeEndWidth - leftHingeSlotWidth - armWidth"
equation "d49 = -armWidth - leftHingeSlotWidth"
equation "d51 = -armWidth"
equation "d53 = cableCutoutRightOffset"
equation "cableCutoutRightOffset = 7 mm"
equation "cableCutoutWidth = 19.58 mm"
equation "cableCutoutDepth = 2 mm"
equation "d57 = cableCutoutWidth"
equation "cableCutoutHeight = 1.75 mm"
equation "d59 = cableCutoutHeight"
equation "d60 = -cableCutoutDepth"
equation "cableHeight = 0.13 mm"
equation "d63 = cableHeight"
equation "d64 = cableMaxWidth"
equation "cableMaxWidth = 18.5 mm"
equation "d66 = cableDepth"
equation "cableDepth = 50 mm"
equation "d69 = cableMinWidth"
equation "cableMinWidth = 12.5 mm"
equation "cableTransitionDepth = 5 mm"
equation "d72 = cableTransitionDepth"
equation "d73 = -cableHeight"
equation "d75 = sliderBackDepth"
equation "slideWidth = 158 mm"
equation "slideHeight = 1 mm"
equation "d79 = -slideHeight"
equation "sliderBackDepth = 42.5 mm"
equation "frontRadius = 5 mm"
equation "d83 = frontRadius"
equation "d84 = frontRadius"
equation "hookDepth = 8.14 mm"
equation "hookHeight = 2 mm"
equation "hookSpaceHeight = 1 mm"
equation "hookInset = 1.60 mm"
equation "d89 = hookInset"
equation "d90 = hookInset"
equation "d91 = hookDepth"
equation "d92 = hookDepth"
equation "d93 = hookHeight"
equation "d95 = hookSpaceHeight"
equation "d97 = hookHeight"
equation "d99 = hookHeight"
equation "d101 = hookHeight"
equation "d103 = hookSpaceHeight"
equation "d104 = -hookInset"
equation "d106 = hookHeight"
equation "d108 = hookSpaceHeight"
equation "d109 = -hookInset"
equation "d111 = frontFeatureWidth"
equation "frontFeatureWidth = 45 mm"
equation "frontFeatureDepth = 1 mm"
equation "frontFeatureHeight = 7.7 mm"
equation "d115 = frontFeatureHeight"
equation "d116 = frontFeatureInnerWidth"
equation "frontFeatureInnerWidth = 20 mm"
equation "d118 = -frontFeatureDepth"
equation "frontHookWidth = 5.72 mm"
equation "frontHookDepth = 4.3 mm"
equation "frontHookLeftOffset = 12.5 mm"
equation "d123 = frontHookLeftOffset"
equation "d124 = frontHookWidth"
equation "d125 = frontHookDepth"
equation "d126 = hookHeight"
equation "d128 = hookSpaceHeight"
equation "frontHookInsetWidth = 2.5 mm"
equation "d130 = -frontHookInsetWidth"
equation "d132 = hookSpaceHeight"
equation "d133 = -frontHookInsetWidth"
equation "d141 = sideDetailDepth"
equation "sideDetailDepth = 6 mm"
equation "d149 = sideDetailDepth"
equation "d156 = leftSlideMargin"
equation "d157 = rightSlideMargin"
equation "rightSlideMargin = 6 mm"
equation "leftSlideMargin = 3 mm"
